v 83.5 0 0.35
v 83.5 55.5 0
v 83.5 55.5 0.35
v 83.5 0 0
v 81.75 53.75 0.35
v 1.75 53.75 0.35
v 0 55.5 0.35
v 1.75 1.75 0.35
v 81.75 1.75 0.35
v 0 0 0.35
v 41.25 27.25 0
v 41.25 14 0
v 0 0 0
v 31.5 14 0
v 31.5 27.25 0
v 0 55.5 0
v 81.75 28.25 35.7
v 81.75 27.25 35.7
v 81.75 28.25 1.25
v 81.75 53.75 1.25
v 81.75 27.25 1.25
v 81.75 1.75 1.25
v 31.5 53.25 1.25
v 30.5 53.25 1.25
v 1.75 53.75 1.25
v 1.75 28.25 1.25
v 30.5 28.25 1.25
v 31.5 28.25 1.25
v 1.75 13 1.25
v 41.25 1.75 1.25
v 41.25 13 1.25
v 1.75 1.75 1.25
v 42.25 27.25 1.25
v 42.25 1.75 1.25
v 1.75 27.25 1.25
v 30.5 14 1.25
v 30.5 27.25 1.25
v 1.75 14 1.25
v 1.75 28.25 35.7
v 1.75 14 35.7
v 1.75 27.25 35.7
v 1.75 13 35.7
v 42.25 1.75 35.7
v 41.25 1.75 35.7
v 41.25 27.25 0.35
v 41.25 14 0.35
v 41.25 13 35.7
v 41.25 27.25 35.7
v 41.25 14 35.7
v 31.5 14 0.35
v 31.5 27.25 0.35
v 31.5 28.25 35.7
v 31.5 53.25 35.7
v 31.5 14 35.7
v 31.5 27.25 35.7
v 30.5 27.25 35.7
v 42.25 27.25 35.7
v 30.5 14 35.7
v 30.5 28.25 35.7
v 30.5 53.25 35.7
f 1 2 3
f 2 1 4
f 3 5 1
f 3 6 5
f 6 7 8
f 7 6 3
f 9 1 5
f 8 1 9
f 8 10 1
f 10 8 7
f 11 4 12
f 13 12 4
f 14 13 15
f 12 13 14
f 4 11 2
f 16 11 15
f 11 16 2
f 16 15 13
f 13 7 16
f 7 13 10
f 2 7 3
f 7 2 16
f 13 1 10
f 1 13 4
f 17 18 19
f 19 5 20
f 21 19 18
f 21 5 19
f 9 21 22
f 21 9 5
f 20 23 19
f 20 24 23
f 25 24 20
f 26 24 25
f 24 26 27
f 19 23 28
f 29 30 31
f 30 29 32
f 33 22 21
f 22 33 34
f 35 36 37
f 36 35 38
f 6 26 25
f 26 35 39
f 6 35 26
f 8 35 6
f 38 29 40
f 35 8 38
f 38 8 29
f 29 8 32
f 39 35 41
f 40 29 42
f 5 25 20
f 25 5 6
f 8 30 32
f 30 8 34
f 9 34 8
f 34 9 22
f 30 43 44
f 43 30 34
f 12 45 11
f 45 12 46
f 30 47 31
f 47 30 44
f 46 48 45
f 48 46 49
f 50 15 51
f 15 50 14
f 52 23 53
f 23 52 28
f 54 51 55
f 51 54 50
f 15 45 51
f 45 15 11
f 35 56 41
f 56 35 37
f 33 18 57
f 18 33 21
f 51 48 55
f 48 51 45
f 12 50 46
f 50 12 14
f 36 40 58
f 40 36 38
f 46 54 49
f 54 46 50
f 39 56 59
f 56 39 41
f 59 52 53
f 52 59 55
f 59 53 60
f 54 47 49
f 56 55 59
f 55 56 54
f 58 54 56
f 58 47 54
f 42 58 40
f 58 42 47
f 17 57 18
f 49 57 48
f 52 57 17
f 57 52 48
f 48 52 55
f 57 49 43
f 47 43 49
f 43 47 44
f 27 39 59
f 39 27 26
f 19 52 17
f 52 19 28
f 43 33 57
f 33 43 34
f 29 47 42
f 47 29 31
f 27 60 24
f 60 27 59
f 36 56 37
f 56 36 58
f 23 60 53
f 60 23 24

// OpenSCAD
/*
Projekt Name: Trennwaende für das Modellhaus 3723
Modul:  Grundplatte und Waende für das Erdgeschoss
Projekt URL: https://github.com/Hardi-St/MobaLedLib_Docu/tree/master/3D_Daten_fuer_die_MobaLedLib/Trennwände%20für%20Häuser
Version: 0.0.1
Autor: Moba-Nick (mobanick@wp12085804.server-he.de)
Lizenz: CC-BY-SA-4.0 (https://creativecommons.org/licenses/by-sa/4.0/legalcode.de)
*/
// Alle Angaben sind immer in mm bei meinen Projekten.
//Parameter für die Grundplatte des Hauses
x_grund = 80;       // Laenge der Grundplatte
y_grund = 52;       // Breite der Grundplatte 
z_grund = 1.25;       // Staerke der Grundplatte
z_erdgeschoss = 35; // Hoehe des Erdgeschosses - 6 mm für die Zwischendecke

// Parameter für die Staerke der Waende
wand_staerke = 1.0;
/*
    Um zu verhindern das die GrundPlatte_Haus in das Haus ruscht, bekommt diese einen Rand der breiter und laenger ist als die Oeffnung. Nachfolgend werden die Werte für die Staerke und dem zusaetzlichen Rand definiert.
*/
z_rand = 0.35;  //Staerke des Zusatzrandes
rand = 1.75;    // Breite des umlaufenden Rands

/*
    Bitte die drei Formeln nicht aendern. Diese errechnen die zusätzlichen Parameter aus den vorhandenen Weten der Zeilen 10 - 22.
*/
x_all = x_grund + rand*2;
y_all = y_grund + rand*2;
z_all = z_grund + z_rand;

/* 
    Wenn die GrundPlatte_Haus eine Halterung für eine Lampe hat oder ein Kabelschacht eine Oeffnung braucht, kann man hier einen Ausschnitt in der GrundPlatte_Haus dafuer vorsehen und die Position und Groesse angeben.
*/
x_cut = 49.25 - 39.25 - wand_staerke*0.25;  // Laenge der Aussparung
y_cut = 12+wand_staerke*1.25;  // Breite der Aussparung
cut_pos_x = 29.25 +wand_staerke/2+ rand; // Punkt X der Aussparung
cut_pos_y = 11.25 + wand_staerke + rand; // Punkt Y der Aussparung 


/*
    Im nachfolgendem Abschnitt wird die Grundplatte und alle Waende erstellt.
    Die Angaben koennen ganz nach belieben abgeaendert werden.
*/
//Erstellen der Grundplatte mit dem Rand, sowie dem Loch für den Kabelschacht (true = mit loch, false = ohne Loch)
GrundPlatte_Haus(true); 
// Die erste Wand ist die, die von links nach rechts geht und das Haus einmal teilt
Wand_DIR_Y(0,y_grund/2,x_grund);
    
// Die zweite Wand geht von der Mitte der Mittelwand bis zur unteren Kante der Grundplatte und teilt den unteren Teil nochmals in zwei Teile.
Wand_DIR_X(x_grund/2, 0,y_grund/2); 

//Die dritte Wand geht von der linken Aussenseite bis zur zweiten Wand
Wand_DIR_Y(0,11.25+wand_staerke/2,40.25);

//Die vierte und letzte Wand. Diese geht von der oberen Kante zu der dritten Wand. Dadurch ist nun auch der Kabelschacht sichtbar.
Wand_DIR_X(29.25,y_grund - (25.25+1.5+12+1.5),37.75+wand_staerke*2);



/* 
!!!!!!!!!!!!!!!!!!!!!!!!!!!!!!!!!!!!!!!!!!!!!!!!!!!!!!!!!!!!!!!!!!!!   
!!!!    Ab hier kommen die Module. Bitte nur aendern wann man   !!!!
!!!!    weiss was man macht.                                    !!!!
!!!!!!!!!!!!!!!!!!!!!!!!!!!!!!!!!!!!!!!!!!!!!!!!!!!!!!!!!!!!!!!!!!!!
/*  
    Das Module GrundPlatte_Haus erstellt die Grundplatte des Hauses inkl. des Aussenrandes um die Grundplatte. Dazu wurde im Bereich für die Parameter in den  Zeilen 10 - 37 die Werte angeben.
*/
module GrundPlatte_Haus(cutting){
        difference(){
            union(){
                cube([x_all,y_all,z_rand],false);
                translate([rand,rand,0]){
                    cube([x_grund,y_grund,z_grund],false);
                }
            }
            // Auschnitt aus der Grundplatte vornehmen
            if (cutting == true){
                translate([cut_pos_x,cut_pos_y,0]){
                    cube([x_cut,y_cut,z_all],false);
                }
            }
        }
}

/*
    Das Modul "Wand_DIR_X" erstellt Waende welche auf der X-Achse (von links nach rechts) verschoben werden koennen.
    Die Hoehe ist dabei immer die gesamte Hoehe des Stockwerkes.
    pos_x   => gibt den Startpunkt auf der X-Achse an.
    pos_y   => gibt den Startpunkt auf der Y-Achse an.
    width_x => gibt an wie lang die Wand werden soll.
    Der Rand um die Grundplatte wird automatisch mit eingerechnet in die Startpositionen.
*/
module Wand_DIR_X(pos_x, pos_y, width_x){
    translate([pos_x + rand -wand_staerke/2,pos_y + rand,z_rand]){
        cube([wand_staerke,width_x, z_erdgeschoss+z_rand]);
    }
}

/*
    Das Modul "Wand_DIR_Y" erstellt Waende welche auf der Y-Achse (von vorne nach hinten) verschoben werden koennen.  
    Die Hoehe ist dabei immer die gesamte Hoehe des Stockwerkes.
    pos_x   => gibt den Startpunkt auf der X-Achse an.
    pos_y   => gibt den Startpunkt auf der Y-Achse an.
    width_y => gibt an wie lang die Wand werden soll.
    Der Rand um die Grundplatte wird automatisch mit eingerechnet in die Startpositionen.
*/
module Wand_DIR_Y(pos_x, pos_y, width_y){
    translate([pos_x + rand,pos_y + rand -wand_staerke/2,z_rand]){
        cube([width_y,wand_staerke, z_erdgeschoss+z_rand]);
    }
}
